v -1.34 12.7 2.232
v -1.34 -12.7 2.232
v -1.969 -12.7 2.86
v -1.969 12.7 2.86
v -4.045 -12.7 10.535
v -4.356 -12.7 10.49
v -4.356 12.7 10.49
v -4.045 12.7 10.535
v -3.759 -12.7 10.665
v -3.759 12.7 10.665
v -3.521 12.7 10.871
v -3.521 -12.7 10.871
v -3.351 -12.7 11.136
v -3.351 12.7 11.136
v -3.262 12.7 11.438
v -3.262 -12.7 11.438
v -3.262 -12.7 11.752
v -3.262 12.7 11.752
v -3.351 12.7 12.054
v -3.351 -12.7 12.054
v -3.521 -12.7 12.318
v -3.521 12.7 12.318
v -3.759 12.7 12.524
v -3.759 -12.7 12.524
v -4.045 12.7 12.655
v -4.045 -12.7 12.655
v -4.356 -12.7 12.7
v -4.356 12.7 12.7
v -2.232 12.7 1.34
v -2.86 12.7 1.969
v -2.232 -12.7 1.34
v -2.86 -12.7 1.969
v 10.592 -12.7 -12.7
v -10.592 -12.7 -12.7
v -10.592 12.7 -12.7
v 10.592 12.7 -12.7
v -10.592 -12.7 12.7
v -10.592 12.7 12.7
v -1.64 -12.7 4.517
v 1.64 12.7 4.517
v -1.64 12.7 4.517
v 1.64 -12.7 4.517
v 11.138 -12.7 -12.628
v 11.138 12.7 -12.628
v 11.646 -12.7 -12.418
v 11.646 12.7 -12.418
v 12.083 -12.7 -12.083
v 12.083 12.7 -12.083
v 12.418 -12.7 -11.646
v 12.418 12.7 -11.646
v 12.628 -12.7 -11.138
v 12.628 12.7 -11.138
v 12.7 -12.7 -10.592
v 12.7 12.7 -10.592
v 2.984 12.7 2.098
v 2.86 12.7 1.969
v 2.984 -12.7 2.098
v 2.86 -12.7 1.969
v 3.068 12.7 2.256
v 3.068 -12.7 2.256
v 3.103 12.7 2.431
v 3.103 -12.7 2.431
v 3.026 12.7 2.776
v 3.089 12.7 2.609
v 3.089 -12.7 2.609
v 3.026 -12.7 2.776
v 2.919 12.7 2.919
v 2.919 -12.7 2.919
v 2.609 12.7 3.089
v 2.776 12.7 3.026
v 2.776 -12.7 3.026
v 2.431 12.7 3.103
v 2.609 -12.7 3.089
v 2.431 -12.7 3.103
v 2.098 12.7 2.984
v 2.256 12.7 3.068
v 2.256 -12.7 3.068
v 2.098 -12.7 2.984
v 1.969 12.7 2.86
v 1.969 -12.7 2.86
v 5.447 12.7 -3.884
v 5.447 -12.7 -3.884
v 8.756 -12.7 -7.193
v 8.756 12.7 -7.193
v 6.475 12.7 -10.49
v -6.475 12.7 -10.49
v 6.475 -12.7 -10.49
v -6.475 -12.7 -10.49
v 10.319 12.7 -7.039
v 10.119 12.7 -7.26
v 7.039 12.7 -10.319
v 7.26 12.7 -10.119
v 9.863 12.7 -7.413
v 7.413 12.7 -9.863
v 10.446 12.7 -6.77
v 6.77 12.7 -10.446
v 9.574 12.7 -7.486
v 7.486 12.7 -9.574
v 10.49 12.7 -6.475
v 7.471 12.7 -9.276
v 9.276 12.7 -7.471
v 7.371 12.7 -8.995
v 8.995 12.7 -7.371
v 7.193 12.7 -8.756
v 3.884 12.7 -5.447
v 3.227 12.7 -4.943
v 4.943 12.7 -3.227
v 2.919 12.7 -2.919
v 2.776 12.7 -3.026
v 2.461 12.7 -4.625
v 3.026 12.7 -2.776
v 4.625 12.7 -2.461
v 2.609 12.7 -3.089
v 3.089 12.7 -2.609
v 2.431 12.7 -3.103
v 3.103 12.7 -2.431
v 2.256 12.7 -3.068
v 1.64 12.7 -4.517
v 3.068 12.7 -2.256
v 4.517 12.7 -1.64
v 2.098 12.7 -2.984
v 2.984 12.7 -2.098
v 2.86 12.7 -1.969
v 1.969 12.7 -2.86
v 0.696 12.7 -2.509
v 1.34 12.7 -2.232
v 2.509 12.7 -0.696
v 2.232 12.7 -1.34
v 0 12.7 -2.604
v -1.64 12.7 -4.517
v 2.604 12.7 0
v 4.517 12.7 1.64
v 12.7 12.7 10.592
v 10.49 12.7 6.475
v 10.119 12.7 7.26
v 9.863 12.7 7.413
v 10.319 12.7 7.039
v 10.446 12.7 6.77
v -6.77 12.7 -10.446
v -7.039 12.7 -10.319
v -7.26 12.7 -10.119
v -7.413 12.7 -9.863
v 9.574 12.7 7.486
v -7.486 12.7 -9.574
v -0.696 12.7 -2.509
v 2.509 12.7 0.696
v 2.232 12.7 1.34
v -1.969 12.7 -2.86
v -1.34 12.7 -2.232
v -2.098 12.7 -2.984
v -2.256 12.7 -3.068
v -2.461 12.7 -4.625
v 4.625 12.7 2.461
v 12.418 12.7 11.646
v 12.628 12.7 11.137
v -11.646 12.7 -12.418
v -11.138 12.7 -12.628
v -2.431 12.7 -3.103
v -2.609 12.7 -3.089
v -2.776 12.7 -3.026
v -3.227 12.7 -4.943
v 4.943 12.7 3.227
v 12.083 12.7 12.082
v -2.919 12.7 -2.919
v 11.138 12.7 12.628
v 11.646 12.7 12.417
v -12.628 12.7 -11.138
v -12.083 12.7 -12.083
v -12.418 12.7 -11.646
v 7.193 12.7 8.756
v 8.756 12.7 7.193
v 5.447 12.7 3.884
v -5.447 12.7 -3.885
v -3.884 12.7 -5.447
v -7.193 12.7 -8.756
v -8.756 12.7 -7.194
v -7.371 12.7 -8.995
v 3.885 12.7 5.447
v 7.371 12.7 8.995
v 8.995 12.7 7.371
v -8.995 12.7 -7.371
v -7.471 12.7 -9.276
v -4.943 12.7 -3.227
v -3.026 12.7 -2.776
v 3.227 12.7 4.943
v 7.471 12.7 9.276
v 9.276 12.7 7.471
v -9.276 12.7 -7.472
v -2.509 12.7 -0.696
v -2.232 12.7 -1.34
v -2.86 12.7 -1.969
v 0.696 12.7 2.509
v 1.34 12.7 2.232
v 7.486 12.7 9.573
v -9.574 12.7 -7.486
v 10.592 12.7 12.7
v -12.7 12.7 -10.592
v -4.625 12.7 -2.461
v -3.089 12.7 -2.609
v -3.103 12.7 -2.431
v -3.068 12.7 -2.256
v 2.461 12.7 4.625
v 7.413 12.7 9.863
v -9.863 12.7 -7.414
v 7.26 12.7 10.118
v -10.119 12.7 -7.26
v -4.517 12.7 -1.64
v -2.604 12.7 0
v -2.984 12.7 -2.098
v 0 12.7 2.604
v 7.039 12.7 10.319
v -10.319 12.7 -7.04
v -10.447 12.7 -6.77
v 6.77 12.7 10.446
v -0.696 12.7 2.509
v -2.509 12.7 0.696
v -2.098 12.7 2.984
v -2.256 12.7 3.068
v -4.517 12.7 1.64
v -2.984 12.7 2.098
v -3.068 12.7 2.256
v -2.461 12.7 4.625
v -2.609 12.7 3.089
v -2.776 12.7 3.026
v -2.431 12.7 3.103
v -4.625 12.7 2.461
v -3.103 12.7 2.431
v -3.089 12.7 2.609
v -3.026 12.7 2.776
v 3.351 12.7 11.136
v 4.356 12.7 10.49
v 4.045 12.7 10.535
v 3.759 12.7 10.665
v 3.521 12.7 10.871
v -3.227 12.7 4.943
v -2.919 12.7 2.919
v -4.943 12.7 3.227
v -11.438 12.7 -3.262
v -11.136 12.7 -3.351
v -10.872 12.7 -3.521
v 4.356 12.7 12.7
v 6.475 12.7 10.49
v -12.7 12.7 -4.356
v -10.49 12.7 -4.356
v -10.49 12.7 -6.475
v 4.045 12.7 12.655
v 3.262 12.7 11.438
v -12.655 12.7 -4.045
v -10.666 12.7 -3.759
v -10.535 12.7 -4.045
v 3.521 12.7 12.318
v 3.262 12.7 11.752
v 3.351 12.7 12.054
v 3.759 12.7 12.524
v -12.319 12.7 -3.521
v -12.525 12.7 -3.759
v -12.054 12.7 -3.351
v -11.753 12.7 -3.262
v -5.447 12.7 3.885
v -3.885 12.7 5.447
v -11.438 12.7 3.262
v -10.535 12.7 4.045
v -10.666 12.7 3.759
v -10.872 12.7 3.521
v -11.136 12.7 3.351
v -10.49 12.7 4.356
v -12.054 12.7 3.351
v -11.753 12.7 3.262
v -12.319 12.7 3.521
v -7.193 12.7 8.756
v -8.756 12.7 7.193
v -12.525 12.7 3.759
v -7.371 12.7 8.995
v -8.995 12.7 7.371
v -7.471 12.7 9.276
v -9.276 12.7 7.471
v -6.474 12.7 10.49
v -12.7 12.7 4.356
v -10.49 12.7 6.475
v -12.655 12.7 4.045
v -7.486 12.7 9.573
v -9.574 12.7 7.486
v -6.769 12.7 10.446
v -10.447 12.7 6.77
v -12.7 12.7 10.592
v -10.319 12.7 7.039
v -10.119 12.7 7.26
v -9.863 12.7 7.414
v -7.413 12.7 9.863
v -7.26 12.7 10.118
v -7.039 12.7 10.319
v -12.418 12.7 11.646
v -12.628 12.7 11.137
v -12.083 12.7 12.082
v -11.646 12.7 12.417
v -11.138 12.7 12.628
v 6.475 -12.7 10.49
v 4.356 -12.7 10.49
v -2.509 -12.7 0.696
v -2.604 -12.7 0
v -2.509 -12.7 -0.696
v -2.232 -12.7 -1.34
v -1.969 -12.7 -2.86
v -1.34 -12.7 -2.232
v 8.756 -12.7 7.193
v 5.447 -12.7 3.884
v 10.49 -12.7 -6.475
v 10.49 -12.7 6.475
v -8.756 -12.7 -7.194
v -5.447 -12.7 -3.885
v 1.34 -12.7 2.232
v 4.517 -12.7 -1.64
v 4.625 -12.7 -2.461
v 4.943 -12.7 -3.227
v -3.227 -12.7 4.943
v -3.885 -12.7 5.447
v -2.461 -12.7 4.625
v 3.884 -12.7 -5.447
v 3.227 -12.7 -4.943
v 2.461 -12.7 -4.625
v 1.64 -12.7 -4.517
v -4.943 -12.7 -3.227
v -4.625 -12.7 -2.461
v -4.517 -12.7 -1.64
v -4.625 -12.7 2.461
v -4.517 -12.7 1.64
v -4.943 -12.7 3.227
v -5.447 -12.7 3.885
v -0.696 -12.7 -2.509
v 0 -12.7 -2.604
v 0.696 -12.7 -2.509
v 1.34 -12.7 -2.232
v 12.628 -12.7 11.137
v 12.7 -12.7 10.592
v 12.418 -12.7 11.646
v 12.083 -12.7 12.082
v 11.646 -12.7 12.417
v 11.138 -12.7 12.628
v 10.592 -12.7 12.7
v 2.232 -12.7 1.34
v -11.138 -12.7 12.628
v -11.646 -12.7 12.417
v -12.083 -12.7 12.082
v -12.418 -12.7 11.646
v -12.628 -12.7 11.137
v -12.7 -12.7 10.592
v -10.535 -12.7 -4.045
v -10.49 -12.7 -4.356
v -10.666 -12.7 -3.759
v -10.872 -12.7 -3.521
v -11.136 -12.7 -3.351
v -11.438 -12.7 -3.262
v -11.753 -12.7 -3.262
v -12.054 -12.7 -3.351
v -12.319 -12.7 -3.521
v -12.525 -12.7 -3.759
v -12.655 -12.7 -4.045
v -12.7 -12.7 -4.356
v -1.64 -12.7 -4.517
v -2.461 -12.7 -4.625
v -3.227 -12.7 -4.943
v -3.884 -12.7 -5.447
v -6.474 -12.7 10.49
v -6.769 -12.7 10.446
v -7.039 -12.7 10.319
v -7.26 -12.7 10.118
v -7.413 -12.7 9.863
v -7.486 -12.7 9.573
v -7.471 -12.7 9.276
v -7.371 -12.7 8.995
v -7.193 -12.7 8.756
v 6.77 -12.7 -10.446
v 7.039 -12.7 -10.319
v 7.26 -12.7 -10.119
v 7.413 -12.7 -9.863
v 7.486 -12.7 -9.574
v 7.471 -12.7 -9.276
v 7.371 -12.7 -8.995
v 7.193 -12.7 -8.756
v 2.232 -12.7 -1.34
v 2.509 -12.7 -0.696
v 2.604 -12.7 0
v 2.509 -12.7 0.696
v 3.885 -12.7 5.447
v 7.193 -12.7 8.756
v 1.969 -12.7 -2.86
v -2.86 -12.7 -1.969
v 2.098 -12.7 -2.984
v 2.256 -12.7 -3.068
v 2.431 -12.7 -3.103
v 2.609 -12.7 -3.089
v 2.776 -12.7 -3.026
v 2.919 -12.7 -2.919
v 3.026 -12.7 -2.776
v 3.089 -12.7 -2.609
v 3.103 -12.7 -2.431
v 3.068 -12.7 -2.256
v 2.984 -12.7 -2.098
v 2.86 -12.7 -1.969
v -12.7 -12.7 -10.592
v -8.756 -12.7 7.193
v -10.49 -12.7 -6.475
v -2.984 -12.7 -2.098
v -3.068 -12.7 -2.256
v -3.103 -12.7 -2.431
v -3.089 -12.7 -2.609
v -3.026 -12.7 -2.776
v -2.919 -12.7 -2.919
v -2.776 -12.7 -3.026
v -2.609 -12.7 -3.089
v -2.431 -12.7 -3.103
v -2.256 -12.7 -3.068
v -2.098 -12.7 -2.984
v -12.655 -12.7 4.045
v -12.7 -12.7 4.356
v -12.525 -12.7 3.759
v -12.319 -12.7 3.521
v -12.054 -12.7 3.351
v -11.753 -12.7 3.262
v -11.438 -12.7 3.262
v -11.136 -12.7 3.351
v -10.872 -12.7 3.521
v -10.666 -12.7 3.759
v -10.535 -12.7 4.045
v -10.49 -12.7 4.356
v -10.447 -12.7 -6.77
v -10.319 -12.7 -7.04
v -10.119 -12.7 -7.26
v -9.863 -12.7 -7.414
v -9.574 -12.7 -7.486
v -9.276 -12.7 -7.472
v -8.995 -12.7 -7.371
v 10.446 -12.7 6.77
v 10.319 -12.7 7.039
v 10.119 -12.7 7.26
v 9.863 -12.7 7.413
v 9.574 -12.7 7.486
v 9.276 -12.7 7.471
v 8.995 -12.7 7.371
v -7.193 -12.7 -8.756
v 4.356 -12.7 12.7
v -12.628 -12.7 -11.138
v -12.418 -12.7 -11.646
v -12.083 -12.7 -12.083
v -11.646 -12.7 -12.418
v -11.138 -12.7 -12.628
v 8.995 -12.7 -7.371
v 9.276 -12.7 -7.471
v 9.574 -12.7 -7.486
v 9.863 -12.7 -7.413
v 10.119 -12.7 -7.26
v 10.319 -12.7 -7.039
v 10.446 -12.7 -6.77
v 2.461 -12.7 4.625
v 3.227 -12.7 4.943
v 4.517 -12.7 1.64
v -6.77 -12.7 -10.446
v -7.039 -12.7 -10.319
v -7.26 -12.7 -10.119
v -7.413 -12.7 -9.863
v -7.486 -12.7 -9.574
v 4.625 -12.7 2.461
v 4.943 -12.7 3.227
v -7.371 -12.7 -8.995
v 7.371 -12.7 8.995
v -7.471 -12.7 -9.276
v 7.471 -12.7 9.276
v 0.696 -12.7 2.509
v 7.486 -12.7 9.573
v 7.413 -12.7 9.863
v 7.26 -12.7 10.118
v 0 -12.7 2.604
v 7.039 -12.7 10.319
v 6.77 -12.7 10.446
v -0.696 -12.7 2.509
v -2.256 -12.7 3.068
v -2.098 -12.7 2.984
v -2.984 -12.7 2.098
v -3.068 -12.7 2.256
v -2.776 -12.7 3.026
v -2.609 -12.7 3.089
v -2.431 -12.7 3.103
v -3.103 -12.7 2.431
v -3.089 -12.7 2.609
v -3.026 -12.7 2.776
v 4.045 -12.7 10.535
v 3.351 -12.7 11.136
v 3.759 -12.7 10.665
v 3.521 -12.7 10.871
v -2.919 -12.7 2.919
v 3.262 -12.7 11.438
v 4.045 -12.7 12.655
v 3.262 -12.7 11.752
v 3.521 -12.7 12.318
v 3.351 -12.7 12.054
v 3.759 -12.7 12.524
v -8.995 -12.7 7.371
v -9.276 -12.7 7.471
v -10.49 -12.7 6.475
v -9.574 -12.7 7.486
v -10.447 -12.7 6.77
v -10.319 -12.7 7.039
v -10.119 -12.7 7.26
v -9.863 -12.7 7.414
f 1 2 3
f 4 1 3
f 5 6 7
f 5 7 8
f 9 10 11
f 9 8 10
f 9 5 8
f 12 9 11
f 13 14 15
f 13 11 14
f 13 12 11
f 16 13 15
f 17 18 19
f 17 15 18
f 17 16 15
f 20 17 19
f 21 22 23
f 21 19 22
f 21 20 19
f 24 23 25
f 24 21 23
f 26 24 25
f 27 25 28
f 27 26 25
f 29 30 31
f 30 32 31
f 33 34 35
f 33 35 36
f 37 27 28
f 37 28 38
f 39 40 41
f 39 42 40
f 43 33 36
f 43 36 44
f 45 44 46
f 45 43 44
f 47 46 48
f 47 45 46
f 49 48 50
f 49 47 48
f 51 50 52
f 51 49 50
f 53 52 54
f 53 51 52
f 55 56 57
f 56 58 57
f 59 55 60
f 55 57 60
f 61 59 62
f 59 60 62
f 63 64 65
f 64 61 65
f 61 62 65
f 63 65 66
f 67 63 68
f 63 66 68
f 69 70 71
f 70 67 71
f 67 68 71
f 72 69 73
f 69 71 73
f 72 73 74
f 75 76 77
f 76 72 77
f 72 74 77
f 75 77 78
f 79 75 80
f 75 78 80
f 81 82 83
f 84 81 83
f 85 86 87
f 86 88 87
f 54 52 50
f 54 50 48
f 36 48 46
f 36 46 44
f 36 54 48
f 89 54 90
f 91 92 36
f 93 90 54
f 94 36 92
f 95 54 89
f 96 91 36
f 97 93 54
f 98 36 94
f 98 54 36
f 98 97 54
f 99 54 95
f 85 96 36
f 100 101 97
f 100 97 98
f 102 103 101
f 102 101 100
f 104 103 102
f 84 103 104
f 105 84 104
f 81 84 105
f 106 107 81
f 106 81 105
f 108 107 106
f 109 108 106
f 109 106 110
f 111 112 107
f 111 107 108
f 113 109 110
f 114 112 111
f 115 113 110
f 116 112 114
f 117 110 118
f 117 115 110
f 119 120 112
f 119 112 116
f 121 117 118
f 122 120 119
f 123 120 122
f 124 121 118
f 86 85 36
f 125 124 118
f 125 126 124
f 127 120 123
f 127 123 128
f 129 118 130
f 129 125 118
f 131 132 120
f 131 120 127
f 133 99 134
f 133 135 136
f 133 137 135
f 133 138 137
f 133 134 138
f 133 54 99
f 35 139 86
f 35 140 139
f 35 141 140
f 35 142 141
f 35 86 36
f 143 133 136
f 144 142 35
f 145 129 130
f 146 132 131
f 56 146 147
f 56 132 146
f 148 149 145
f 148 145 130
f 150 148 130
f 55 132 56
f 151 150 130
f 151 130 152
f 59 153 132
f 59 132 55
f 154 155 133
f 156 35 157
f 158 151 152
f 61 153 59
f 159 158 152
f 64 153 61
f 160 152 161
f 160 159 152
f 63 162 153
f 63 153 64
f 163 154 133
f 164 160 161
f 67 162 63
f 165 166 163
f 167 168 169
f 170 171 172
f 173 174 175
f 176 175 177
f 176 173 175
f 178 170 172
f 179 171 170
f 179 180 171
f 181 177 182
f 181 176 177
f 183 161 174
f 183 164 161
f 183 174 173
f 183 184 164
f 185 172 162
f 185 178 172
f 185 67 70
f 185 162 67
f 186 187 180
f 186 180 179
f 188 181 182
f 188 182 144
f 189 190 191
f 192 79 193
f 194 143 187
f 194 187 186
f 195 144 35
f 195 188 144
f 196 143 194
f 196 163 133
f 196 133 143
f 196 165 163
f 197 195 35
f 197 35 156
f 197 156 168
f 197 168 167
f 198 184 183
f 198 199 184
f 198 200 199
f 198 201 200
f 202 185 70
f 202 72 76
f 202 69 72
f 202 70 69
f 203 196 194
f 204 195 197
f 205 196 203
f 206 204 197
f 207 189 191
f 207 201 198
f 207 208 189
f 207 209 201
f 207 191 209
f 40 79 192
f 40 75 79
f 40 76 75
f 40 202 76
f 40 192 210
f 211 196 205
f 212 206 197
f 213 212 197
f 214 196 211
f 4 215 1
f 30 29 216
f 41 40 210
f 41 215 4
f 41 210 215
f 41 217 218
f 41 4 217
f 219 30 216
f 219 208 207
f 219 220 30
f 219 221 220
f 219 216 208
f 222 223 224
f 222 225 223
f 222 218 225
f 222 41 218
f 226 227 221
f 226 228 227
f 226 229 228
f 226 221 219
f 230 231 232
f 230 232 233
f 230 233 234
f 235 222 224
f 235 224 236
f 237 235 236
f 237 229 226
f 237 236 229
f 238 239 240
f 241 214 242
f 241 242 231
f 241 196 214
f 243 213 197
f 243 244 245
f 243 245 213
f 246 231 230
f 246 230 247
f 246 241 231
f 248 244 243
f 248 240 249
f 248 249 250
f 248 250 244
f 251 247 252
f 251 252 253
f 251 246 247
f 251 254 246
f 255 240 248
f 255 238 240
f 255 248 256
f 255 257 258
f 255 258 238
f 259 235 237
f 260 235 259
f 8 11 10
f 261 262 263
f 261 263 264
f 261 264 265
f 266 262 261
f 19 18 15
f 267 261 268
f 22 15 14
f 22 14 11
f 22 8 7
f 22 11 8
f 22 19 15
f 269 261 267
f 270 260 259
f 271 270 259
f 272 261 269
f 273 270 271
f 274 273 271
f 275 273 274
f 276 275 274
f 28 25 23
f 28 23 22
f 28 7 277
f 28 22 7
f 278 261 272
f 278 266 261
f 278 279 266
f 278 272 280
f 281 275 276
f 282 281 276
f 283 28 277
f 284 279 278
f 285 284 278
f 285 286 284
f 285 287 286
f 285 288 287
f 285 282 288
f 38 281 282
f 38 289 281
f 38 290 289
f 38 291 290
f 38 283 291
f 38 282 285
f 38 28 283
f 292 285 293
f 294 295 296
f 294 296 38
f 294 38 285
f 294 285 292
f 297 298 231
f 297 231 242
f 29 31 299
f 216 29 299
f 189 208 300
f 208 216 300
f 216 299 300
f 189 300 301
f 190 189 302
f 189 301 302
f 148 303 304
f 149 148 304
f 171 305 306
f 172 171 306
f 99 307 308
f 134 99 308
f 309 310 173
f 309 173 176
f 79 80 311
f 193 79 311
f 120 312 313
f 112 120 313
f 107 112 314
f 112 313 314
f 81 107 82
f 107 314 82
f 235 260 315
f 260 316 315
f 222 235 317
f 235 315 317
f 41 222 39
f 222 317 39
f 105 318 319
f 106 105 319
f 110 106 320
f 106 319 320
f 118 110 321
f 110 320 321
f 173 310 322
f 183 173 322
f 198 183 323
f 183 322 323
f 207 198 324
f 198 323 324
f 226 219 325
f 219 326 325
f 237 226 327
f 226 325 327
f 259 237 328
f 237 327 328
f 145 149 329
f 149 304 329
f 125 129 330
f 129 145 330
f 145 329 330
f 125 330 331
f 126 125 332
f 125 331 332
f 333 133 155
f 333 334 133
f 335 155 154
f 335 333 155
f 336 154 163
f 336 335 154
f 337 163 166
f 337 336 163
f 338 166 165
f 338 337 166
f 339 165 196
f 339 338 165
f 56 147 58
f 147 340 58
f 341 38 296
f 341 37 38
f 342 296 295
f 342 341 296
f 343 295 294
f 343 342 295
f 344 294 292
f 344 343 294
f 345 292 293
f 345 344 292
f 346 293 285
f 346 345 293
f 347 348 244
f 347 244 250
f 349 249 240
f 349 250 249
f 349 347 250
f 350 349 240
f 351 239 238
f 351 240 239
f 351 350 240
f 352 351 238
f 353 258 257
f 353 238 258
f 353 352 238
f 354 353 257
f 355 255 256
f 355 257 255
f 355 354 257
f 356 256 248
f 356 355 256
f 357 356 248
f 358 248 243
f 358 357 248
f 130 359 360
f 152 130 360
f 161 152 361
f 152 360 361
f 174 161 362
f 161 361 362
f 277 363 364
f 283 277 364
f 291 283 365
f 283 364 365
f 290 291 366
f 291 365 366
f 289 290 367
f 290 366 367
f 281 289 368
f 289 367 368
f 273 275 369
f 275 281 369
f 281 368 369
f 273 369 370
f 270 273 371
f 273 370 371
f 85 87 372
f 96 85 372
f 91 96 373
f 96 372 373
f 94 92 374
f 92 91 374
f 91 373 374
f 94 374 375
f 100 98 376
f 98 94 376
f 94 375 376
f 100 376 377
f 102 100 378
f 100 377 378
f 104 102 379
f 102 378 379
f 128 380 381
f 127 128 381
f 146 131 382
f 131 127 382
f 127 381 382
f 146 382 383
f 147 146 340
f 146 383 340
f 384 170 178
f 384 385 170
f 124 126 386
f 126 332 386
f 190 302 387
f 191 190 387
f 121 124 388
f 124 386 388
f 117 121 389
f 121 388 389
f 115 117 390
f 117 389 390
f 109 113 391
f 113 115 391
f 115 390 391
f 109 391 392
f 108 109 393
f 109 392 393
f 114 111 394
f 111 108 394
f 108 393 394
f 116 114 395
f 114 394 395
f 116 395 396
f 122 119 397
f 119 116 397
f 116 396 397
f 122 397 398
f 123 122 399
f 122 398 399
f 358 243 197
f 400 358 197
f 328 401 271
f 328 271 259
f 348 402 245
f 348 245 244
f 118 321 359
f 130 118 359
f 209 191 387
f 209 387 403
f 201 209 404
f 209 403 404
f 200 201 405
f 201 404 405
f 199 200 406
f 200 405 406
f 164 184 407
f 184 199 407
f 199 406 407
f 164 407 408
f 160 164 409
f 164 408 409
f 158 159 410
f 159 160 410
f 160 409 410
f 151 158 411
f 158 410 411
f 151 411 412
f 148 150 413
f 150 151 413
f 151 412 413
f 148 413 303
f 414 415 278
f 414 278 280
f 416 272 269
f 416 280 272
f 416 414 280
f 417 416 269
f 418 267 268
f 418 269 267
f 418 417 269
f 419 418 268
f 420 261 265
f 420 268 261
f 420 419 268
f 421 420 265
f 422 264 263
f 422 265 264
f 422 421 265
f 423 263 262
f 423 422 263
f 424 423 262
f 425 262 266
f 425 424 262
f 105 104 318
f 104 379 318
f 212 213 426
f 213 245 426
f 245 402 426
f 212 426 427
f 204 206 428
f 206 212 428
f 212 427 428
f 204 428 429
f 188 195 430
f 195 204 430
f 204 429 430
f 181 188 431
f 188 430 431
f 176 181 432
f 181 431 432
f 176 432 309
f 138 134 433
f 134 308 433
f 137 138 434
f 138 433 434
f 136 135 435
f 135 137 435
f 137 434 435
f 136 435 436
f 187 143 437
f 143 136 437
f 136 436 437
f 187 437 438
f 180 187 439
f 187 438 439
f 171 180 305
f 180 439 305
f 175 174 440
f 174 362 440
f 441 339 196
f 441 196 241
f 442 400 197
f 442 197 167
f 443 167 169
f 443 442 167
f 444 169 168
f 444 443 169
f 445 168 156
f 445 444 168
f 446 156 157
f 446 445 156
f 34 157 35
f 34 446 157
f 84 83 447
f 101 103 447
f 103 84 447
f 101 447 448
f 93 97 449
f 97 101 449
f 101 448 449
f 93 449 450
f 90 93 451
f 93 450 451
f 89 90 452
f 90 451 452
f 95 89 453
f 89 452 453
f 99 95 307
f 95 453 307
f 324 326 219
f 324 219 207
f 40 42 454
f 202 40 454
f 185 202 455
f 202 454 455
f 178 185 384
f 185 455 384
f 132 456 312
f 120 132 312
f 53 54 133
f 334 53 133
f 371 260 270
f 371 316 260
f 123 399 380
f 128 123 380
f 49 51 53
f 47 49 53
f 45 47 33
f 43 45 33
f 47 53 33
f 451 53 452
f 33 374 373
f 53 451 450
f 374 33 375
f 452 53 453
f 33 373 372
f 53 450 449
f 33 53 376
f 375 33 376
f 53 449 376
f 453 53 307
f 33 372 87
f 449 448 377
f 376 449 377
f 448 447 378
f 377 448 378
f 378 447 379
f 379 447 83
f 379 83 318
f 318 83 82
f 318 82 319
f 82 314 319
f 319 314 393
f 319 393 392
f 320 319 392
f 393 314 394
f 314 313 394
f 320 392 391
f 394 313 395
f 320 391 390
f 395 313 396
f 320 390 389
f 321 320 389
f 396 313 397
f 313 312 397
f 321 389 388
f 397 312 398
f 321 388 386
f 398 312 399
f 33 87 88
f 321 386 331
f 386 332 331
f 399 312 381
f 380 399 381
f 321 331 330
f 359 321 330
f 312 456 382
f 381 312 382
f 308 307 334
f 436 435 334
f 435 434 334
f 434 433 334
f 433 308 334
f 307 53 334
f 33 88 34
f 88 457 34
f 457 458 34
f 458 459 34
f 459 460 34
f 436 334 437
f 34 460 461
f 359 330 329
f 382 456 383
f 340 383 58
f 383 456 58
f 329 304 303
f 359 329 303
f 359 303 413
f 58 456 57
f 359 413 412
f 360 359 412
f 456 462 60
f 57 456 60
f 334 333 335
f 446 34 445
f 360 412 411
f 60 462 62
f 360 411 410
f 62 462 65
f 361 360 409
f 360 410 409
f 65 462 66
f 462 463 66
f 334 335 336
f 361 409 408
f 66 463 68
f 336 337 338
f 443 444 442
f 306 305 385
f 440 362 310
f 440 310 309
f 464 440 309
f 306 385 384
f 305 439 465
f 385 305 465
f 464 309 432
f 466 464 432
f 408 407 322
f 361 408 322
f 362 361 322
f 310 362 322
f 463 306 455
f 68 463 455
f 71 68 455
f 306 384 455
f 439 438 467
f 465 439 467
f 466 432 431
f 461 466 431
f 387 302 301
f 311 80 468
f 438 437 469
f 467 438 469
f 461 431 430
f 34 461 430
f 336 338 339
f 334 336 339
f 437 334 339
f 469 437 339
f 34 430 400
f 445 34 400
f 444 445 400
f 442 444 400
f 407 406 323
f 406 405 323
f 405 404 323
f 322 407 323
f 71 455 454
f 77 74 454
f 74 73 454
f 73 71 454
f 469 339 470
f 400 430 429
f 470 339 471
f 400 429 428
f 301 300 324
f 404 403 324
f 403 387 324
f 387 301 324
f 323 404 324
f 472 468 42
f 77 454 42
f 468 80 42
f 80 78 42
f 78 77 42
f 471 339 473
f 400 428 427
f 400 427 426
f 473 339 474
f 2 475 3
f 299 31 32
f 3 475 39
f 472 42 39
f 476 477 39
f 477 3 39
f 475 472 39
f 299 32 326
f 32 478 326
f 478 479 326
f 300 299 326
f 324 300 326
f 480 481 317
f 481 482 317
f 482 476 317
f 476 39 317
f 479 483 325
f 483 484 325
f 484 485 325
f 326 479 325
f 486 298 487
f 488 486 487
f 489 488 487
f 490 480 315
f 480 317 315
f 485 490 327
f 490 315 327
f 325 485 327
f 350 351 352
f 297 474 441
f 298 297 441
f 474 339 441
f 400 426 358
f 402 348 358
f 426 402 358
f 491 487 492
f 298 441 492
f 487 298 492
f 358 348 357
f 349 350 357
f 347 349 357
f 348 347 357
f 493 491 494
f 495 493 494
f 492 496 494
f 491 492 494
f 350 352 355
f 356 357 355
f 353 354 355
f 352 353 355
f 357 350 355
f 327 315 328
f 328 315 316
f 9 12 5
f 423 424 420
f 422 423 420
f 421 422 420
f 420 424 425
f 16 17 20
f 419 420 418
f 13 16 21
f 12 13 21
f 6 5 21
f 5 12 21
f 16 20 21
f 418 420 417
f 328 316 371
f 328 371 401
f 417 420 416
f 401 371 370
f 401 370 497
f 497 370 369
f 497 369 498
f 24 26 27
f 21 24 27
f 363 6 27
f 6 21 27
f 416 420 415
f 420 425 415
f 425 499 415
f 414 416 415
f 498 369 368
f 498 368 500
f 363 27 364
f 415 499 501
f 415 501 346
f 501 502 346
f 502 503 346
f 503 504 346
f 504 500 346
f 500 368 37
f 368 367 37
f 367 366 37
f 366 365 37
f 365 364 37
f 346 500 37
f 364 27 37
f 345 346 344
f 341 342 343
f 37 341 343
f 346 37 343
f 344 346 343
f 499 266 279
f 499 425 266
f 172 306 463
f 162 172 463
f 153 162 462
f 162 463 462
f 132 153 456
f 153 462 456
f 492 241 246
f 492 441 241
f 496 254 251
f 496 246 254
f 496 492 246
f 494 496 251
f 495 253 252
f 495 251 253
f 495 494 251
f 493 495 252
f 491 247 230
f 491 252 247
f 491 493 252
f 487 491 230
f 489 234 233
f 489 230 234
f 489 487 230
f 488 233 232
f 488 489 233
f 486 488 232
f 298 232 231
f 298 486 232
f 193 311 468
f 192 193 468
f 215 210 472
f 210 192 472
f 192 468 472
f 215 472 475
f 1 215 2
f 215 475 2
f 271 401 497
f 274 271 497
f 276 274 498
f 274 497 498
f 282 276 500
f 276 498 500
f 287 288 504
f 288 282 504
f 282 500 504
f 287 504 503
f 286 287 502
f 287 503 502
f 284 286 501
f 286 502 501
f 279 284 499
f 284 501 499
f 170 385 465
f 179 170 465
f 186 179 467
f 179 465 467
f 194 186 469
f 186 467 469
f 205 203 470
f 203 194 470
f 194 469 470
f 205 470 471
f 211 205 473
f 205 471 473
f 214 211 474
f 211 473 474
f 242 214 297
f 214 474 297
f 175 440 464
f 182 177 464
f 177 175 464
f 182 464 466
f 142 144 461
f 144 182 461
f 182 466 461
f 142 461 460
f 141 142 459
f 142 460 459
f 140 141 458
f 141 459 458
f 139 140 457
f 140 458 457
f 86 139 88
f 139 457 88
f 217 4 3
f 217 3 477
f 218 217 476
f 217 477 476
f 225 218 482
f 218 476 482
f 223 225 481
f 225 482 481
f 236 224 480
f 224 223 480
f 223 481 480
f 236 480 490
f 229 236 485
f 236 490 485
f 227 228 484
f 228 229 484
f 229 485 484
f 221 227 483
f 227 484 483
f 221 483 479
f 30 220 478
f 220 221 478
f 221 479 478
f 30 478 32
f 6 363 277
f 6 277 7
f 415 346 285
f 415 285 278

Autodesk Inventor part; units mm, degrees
ref_plane "YZ Plane" through (0, 0, 0) normal (1, 0, 0) x (0, 1, 0)
ref_plane "XZ Plane" through (0, 0, 0) normal (0, 1, 0) x (-1, 0, 0)
ref_plane "XY Plane" through (0, 0, 0) normal (0, 0, 1) x (1, 0, 0)
sketch "Sketch1" plane through (0, 0, 0) normal (0, 1, 0) x (-1, 0, 0)
  arc A0 (-1.9692, 2.8605) -> (-2.8605, 1.9692) centre (-2.4696, 2.4696) ccw
  line L0 (-2.2319, 1.3405) -> (-2.8605, 1.9692)
  arc A1 (-2.2319, 1.3405) -> (-2.2319, -1.3405) centre (0, 0) ccw
  line L1 (-2.8605, -1.9692) -> (-2.2319, -1.3405)
  arc A2 (-2.8605, -1.9692) -> (-1.9692, -2.8605) centre (-2.4696, -2.4696) ccw
  line L2 (-1.3405, -2.2319) -> (-1.9692, -2.8605)
  arc A3 (-1.3405, -2.2319) -> (1.3405, -2.2319) centre (0, 0) ccw
  line L3 (1.9692, -2.8605) -> (1.3405, -2.2319)
  arc A4 (1.9692, -2.8605) -> (2.8605, -1.9692) centre (2.4696, -2.4696) ccw
  line L4 (2.2319, -1.3405) -> (2.8605, -1.9692)
  arc A5 (2.2319, -1.3405) -> (2.2319, 1.3405) centre (0, 0) ccw
  line L5 (2.8605, 1.9692) -> (2.2319, 1.3405)
  arc A6 (2.8605, 1.9692) -> (1.9692, 2.8605) centre (2.4696, 2.4696) ccw
  line L6 (1.3405, 2.2319) -> (1.9692, 2.8605)
  arc A7 (1.3405, 2.2319) -> (-1.3405, 2.2319) centre (0, 0) ccw
  line L7 (-1.9692, 2.8605) -> (-1.3405, 2.2319)
  arc A8 (-8.7558, 7.1932) -> (-10.4902, 6.4748) centre (-9.4742, 6.4748) ccw
  line L8 (-10.4902, -6.4748) -> (-10.4902, 6.4748)
  arc A9 (-10.4902, -6.4748) -> (-8.7558, -7.1932) centre (-9.4742, -6.4748) ccw
  line L9 (-5.4471, -3.8845) -> (-8.7558, -7.1932)
  arc A10 (-5.4471, -3.8845) -> (-4.5172, -1.6395) centre (-7.6922, -1.6395) ccw
  line L10 (-4.5172, 1.6395) -> (-4.5172, -1.6395)
  arc A11 (-4.5172, 1.6395) -> (-5.4471, 3.8845) centre (-7.6922, 1.6395) ccw
  line L11 (-8.7558, 7.1932) -> (-5.4471, 3.8845)
  arc A12 (3.8845, -5.4471) -> (1.6395, -4.5172) centre (1.6395, -7.6922) ccw
  line L12 (-1.6395, -4.5172) -> (1.6395, -4.5172)
  arc A13 (-1.6395, -4.5172) -> (-3.8845, -5.4471) centre (-1.6395, -7.6922) ccw
  line L13 (-7.1932, -8.7558) -> (-3.8845, -5.4471)
  arc A14 (-7.1932, -8.7558) -> (-6.4748, -10.4902) centre (-6.4748, -9.4742) ccw
  line L14 (6.4748, -10.4902) -> (-6.4748, -10.4902)
  arc A15 (6.4748, -10.4902) -> (7.1932, -8.7558) centre (6.4748, -9.4742) ccw
  line L15 (3.8845, -5.4471) -> (7.1932, -8.7558)
  arc A16 (-12.7002, -10.5921) -> (-10.592, -12.7003) centre (-10.592, -10.5921) ccw
  line L16 (-12.7002, -10.5921) -> (-12.7002, 10.5915)
  arc A17 (-10.592, 12.6997) -> (-12.7002, 10.5915) centre (-10.592, 10.5915) ccw
  line L17 (-10.592, 12.6997) -> (-4.3561, 12.6997)
  arc A18 (-4.3561, 10.4899) -> (-4.3561, 12.6997) centre (-4.3561, 11.5948) ccw
  line L18 (-4.3561, 10.4899) -> (-6.4746, 10.4899)
  arc A19 (-6.4746, 10.4899) -> (-7.193, 8.7555) centre (-6.4746, 9.4739) ccw
  line L19 (-7.193, 8.7555) -> (-3.8847, 5.4472)
  arc A20 (-3.8847, 5.4472) -> (-1.6396, 4.5172) centre (-1.6396, 7.6922) ccw
  line L20 (-1.6396, 4.5172) -> (1.6395, 4.5172)
  arc A21 (1.6395, 4.5172) -> (3.8846, 5.4472) centre (1.6395, 7.6922) ccw
  line L21 (3.8846, 5.4472) -> (7.1929, 8.7555)
  arc A22 (7.1929, 8.7555) -> (6.4745, 10.4899) centre (6.4745, 9.4739) ccw
  line L22 (6.4745, 10.4899) -> (4.3561, 10.4899)
  arc A23 (4.3561, 12.6997) -> (4.3561, 10.4899) centre (4.3561, 11.5948) ccw
  line L23 (4.3561, 12.6997) -> (10.592, 12.6997)
  arc A24 (12.7002, 10.5915) -> (10.592, 12.6997) centre (10.592, 10.5915) ccw
  line L24 (12.7002, 10.5915) -> (12.7002, 4.3561)
  arc A25 (10.4904, 4.3561) -> (12.7002, 4.3561) centre (11.5953, 4.3561) ccw
  line L25 (10.4904, 4.3561) -> (10.4904, 6.475)
  arc A26 (10.4904, 6.475) -> (8.756, 7.1934) centre (9.4744, 6.475) ccw
  line L26 (8.756, 7.1934) -> (5.4472, 3.8846)
  arc A27 (5.4472, 3.8846) -> (4.5172, 1.6395) centre (7.6922, 1.6395) ccw
  line L27 (4.5172, 1.6395) -> (4.5172, -1.6396)
  arc A28 (4.5172, -1.6396) -> (5.4472, -3.8847) centre (7.6922, -1.6396) ccw
  line L28 (5.4472, -3.8847) -> (8.756, -7.1935)
  arc A29 (8.756, -7.1935) -> (10.4904, -6.4751) centre (9.4744, -6.4751) ccw
  line L29 (10.4904, -6.4751) -> (10.4904, -4.3561)
  arc A30 (12.7002, -4.3561) -> (10.4904, -4.3561) centre (11.5953, -4.3561) ccw
  line L30 (12.7002, -4.3561) -> (12.7002, -10.5921)
  arc A31 (10.592, -12.7003) -> (12.7002, -10.5921) centre (10.592, -10.5921) ccw
  line L31 (10.592, -12.7003) -> (-10.592, -12.7003)
  point P0 (0, 0)
  dimension "d23" = 8.183
  dimension "d69" = 1.016
  dimension "d70" = 3.175
  dimension "d86" = 17.2174
  dimension "d87" = 23.1904
  dimension "d88" = 25.4004
  dimension "d89" = 17.2169
  dimension "d90" = 23.1899
  dimension "d92" = 8.1825
  dimension "d93" = 2.2098
  dimension "d96" = 2.2097
extrude "Extrusion1" add sketch "Sketch1" along normal mid plane 25.4
properties part number "1002-S-BLACK-FB" material "6105-T5"
